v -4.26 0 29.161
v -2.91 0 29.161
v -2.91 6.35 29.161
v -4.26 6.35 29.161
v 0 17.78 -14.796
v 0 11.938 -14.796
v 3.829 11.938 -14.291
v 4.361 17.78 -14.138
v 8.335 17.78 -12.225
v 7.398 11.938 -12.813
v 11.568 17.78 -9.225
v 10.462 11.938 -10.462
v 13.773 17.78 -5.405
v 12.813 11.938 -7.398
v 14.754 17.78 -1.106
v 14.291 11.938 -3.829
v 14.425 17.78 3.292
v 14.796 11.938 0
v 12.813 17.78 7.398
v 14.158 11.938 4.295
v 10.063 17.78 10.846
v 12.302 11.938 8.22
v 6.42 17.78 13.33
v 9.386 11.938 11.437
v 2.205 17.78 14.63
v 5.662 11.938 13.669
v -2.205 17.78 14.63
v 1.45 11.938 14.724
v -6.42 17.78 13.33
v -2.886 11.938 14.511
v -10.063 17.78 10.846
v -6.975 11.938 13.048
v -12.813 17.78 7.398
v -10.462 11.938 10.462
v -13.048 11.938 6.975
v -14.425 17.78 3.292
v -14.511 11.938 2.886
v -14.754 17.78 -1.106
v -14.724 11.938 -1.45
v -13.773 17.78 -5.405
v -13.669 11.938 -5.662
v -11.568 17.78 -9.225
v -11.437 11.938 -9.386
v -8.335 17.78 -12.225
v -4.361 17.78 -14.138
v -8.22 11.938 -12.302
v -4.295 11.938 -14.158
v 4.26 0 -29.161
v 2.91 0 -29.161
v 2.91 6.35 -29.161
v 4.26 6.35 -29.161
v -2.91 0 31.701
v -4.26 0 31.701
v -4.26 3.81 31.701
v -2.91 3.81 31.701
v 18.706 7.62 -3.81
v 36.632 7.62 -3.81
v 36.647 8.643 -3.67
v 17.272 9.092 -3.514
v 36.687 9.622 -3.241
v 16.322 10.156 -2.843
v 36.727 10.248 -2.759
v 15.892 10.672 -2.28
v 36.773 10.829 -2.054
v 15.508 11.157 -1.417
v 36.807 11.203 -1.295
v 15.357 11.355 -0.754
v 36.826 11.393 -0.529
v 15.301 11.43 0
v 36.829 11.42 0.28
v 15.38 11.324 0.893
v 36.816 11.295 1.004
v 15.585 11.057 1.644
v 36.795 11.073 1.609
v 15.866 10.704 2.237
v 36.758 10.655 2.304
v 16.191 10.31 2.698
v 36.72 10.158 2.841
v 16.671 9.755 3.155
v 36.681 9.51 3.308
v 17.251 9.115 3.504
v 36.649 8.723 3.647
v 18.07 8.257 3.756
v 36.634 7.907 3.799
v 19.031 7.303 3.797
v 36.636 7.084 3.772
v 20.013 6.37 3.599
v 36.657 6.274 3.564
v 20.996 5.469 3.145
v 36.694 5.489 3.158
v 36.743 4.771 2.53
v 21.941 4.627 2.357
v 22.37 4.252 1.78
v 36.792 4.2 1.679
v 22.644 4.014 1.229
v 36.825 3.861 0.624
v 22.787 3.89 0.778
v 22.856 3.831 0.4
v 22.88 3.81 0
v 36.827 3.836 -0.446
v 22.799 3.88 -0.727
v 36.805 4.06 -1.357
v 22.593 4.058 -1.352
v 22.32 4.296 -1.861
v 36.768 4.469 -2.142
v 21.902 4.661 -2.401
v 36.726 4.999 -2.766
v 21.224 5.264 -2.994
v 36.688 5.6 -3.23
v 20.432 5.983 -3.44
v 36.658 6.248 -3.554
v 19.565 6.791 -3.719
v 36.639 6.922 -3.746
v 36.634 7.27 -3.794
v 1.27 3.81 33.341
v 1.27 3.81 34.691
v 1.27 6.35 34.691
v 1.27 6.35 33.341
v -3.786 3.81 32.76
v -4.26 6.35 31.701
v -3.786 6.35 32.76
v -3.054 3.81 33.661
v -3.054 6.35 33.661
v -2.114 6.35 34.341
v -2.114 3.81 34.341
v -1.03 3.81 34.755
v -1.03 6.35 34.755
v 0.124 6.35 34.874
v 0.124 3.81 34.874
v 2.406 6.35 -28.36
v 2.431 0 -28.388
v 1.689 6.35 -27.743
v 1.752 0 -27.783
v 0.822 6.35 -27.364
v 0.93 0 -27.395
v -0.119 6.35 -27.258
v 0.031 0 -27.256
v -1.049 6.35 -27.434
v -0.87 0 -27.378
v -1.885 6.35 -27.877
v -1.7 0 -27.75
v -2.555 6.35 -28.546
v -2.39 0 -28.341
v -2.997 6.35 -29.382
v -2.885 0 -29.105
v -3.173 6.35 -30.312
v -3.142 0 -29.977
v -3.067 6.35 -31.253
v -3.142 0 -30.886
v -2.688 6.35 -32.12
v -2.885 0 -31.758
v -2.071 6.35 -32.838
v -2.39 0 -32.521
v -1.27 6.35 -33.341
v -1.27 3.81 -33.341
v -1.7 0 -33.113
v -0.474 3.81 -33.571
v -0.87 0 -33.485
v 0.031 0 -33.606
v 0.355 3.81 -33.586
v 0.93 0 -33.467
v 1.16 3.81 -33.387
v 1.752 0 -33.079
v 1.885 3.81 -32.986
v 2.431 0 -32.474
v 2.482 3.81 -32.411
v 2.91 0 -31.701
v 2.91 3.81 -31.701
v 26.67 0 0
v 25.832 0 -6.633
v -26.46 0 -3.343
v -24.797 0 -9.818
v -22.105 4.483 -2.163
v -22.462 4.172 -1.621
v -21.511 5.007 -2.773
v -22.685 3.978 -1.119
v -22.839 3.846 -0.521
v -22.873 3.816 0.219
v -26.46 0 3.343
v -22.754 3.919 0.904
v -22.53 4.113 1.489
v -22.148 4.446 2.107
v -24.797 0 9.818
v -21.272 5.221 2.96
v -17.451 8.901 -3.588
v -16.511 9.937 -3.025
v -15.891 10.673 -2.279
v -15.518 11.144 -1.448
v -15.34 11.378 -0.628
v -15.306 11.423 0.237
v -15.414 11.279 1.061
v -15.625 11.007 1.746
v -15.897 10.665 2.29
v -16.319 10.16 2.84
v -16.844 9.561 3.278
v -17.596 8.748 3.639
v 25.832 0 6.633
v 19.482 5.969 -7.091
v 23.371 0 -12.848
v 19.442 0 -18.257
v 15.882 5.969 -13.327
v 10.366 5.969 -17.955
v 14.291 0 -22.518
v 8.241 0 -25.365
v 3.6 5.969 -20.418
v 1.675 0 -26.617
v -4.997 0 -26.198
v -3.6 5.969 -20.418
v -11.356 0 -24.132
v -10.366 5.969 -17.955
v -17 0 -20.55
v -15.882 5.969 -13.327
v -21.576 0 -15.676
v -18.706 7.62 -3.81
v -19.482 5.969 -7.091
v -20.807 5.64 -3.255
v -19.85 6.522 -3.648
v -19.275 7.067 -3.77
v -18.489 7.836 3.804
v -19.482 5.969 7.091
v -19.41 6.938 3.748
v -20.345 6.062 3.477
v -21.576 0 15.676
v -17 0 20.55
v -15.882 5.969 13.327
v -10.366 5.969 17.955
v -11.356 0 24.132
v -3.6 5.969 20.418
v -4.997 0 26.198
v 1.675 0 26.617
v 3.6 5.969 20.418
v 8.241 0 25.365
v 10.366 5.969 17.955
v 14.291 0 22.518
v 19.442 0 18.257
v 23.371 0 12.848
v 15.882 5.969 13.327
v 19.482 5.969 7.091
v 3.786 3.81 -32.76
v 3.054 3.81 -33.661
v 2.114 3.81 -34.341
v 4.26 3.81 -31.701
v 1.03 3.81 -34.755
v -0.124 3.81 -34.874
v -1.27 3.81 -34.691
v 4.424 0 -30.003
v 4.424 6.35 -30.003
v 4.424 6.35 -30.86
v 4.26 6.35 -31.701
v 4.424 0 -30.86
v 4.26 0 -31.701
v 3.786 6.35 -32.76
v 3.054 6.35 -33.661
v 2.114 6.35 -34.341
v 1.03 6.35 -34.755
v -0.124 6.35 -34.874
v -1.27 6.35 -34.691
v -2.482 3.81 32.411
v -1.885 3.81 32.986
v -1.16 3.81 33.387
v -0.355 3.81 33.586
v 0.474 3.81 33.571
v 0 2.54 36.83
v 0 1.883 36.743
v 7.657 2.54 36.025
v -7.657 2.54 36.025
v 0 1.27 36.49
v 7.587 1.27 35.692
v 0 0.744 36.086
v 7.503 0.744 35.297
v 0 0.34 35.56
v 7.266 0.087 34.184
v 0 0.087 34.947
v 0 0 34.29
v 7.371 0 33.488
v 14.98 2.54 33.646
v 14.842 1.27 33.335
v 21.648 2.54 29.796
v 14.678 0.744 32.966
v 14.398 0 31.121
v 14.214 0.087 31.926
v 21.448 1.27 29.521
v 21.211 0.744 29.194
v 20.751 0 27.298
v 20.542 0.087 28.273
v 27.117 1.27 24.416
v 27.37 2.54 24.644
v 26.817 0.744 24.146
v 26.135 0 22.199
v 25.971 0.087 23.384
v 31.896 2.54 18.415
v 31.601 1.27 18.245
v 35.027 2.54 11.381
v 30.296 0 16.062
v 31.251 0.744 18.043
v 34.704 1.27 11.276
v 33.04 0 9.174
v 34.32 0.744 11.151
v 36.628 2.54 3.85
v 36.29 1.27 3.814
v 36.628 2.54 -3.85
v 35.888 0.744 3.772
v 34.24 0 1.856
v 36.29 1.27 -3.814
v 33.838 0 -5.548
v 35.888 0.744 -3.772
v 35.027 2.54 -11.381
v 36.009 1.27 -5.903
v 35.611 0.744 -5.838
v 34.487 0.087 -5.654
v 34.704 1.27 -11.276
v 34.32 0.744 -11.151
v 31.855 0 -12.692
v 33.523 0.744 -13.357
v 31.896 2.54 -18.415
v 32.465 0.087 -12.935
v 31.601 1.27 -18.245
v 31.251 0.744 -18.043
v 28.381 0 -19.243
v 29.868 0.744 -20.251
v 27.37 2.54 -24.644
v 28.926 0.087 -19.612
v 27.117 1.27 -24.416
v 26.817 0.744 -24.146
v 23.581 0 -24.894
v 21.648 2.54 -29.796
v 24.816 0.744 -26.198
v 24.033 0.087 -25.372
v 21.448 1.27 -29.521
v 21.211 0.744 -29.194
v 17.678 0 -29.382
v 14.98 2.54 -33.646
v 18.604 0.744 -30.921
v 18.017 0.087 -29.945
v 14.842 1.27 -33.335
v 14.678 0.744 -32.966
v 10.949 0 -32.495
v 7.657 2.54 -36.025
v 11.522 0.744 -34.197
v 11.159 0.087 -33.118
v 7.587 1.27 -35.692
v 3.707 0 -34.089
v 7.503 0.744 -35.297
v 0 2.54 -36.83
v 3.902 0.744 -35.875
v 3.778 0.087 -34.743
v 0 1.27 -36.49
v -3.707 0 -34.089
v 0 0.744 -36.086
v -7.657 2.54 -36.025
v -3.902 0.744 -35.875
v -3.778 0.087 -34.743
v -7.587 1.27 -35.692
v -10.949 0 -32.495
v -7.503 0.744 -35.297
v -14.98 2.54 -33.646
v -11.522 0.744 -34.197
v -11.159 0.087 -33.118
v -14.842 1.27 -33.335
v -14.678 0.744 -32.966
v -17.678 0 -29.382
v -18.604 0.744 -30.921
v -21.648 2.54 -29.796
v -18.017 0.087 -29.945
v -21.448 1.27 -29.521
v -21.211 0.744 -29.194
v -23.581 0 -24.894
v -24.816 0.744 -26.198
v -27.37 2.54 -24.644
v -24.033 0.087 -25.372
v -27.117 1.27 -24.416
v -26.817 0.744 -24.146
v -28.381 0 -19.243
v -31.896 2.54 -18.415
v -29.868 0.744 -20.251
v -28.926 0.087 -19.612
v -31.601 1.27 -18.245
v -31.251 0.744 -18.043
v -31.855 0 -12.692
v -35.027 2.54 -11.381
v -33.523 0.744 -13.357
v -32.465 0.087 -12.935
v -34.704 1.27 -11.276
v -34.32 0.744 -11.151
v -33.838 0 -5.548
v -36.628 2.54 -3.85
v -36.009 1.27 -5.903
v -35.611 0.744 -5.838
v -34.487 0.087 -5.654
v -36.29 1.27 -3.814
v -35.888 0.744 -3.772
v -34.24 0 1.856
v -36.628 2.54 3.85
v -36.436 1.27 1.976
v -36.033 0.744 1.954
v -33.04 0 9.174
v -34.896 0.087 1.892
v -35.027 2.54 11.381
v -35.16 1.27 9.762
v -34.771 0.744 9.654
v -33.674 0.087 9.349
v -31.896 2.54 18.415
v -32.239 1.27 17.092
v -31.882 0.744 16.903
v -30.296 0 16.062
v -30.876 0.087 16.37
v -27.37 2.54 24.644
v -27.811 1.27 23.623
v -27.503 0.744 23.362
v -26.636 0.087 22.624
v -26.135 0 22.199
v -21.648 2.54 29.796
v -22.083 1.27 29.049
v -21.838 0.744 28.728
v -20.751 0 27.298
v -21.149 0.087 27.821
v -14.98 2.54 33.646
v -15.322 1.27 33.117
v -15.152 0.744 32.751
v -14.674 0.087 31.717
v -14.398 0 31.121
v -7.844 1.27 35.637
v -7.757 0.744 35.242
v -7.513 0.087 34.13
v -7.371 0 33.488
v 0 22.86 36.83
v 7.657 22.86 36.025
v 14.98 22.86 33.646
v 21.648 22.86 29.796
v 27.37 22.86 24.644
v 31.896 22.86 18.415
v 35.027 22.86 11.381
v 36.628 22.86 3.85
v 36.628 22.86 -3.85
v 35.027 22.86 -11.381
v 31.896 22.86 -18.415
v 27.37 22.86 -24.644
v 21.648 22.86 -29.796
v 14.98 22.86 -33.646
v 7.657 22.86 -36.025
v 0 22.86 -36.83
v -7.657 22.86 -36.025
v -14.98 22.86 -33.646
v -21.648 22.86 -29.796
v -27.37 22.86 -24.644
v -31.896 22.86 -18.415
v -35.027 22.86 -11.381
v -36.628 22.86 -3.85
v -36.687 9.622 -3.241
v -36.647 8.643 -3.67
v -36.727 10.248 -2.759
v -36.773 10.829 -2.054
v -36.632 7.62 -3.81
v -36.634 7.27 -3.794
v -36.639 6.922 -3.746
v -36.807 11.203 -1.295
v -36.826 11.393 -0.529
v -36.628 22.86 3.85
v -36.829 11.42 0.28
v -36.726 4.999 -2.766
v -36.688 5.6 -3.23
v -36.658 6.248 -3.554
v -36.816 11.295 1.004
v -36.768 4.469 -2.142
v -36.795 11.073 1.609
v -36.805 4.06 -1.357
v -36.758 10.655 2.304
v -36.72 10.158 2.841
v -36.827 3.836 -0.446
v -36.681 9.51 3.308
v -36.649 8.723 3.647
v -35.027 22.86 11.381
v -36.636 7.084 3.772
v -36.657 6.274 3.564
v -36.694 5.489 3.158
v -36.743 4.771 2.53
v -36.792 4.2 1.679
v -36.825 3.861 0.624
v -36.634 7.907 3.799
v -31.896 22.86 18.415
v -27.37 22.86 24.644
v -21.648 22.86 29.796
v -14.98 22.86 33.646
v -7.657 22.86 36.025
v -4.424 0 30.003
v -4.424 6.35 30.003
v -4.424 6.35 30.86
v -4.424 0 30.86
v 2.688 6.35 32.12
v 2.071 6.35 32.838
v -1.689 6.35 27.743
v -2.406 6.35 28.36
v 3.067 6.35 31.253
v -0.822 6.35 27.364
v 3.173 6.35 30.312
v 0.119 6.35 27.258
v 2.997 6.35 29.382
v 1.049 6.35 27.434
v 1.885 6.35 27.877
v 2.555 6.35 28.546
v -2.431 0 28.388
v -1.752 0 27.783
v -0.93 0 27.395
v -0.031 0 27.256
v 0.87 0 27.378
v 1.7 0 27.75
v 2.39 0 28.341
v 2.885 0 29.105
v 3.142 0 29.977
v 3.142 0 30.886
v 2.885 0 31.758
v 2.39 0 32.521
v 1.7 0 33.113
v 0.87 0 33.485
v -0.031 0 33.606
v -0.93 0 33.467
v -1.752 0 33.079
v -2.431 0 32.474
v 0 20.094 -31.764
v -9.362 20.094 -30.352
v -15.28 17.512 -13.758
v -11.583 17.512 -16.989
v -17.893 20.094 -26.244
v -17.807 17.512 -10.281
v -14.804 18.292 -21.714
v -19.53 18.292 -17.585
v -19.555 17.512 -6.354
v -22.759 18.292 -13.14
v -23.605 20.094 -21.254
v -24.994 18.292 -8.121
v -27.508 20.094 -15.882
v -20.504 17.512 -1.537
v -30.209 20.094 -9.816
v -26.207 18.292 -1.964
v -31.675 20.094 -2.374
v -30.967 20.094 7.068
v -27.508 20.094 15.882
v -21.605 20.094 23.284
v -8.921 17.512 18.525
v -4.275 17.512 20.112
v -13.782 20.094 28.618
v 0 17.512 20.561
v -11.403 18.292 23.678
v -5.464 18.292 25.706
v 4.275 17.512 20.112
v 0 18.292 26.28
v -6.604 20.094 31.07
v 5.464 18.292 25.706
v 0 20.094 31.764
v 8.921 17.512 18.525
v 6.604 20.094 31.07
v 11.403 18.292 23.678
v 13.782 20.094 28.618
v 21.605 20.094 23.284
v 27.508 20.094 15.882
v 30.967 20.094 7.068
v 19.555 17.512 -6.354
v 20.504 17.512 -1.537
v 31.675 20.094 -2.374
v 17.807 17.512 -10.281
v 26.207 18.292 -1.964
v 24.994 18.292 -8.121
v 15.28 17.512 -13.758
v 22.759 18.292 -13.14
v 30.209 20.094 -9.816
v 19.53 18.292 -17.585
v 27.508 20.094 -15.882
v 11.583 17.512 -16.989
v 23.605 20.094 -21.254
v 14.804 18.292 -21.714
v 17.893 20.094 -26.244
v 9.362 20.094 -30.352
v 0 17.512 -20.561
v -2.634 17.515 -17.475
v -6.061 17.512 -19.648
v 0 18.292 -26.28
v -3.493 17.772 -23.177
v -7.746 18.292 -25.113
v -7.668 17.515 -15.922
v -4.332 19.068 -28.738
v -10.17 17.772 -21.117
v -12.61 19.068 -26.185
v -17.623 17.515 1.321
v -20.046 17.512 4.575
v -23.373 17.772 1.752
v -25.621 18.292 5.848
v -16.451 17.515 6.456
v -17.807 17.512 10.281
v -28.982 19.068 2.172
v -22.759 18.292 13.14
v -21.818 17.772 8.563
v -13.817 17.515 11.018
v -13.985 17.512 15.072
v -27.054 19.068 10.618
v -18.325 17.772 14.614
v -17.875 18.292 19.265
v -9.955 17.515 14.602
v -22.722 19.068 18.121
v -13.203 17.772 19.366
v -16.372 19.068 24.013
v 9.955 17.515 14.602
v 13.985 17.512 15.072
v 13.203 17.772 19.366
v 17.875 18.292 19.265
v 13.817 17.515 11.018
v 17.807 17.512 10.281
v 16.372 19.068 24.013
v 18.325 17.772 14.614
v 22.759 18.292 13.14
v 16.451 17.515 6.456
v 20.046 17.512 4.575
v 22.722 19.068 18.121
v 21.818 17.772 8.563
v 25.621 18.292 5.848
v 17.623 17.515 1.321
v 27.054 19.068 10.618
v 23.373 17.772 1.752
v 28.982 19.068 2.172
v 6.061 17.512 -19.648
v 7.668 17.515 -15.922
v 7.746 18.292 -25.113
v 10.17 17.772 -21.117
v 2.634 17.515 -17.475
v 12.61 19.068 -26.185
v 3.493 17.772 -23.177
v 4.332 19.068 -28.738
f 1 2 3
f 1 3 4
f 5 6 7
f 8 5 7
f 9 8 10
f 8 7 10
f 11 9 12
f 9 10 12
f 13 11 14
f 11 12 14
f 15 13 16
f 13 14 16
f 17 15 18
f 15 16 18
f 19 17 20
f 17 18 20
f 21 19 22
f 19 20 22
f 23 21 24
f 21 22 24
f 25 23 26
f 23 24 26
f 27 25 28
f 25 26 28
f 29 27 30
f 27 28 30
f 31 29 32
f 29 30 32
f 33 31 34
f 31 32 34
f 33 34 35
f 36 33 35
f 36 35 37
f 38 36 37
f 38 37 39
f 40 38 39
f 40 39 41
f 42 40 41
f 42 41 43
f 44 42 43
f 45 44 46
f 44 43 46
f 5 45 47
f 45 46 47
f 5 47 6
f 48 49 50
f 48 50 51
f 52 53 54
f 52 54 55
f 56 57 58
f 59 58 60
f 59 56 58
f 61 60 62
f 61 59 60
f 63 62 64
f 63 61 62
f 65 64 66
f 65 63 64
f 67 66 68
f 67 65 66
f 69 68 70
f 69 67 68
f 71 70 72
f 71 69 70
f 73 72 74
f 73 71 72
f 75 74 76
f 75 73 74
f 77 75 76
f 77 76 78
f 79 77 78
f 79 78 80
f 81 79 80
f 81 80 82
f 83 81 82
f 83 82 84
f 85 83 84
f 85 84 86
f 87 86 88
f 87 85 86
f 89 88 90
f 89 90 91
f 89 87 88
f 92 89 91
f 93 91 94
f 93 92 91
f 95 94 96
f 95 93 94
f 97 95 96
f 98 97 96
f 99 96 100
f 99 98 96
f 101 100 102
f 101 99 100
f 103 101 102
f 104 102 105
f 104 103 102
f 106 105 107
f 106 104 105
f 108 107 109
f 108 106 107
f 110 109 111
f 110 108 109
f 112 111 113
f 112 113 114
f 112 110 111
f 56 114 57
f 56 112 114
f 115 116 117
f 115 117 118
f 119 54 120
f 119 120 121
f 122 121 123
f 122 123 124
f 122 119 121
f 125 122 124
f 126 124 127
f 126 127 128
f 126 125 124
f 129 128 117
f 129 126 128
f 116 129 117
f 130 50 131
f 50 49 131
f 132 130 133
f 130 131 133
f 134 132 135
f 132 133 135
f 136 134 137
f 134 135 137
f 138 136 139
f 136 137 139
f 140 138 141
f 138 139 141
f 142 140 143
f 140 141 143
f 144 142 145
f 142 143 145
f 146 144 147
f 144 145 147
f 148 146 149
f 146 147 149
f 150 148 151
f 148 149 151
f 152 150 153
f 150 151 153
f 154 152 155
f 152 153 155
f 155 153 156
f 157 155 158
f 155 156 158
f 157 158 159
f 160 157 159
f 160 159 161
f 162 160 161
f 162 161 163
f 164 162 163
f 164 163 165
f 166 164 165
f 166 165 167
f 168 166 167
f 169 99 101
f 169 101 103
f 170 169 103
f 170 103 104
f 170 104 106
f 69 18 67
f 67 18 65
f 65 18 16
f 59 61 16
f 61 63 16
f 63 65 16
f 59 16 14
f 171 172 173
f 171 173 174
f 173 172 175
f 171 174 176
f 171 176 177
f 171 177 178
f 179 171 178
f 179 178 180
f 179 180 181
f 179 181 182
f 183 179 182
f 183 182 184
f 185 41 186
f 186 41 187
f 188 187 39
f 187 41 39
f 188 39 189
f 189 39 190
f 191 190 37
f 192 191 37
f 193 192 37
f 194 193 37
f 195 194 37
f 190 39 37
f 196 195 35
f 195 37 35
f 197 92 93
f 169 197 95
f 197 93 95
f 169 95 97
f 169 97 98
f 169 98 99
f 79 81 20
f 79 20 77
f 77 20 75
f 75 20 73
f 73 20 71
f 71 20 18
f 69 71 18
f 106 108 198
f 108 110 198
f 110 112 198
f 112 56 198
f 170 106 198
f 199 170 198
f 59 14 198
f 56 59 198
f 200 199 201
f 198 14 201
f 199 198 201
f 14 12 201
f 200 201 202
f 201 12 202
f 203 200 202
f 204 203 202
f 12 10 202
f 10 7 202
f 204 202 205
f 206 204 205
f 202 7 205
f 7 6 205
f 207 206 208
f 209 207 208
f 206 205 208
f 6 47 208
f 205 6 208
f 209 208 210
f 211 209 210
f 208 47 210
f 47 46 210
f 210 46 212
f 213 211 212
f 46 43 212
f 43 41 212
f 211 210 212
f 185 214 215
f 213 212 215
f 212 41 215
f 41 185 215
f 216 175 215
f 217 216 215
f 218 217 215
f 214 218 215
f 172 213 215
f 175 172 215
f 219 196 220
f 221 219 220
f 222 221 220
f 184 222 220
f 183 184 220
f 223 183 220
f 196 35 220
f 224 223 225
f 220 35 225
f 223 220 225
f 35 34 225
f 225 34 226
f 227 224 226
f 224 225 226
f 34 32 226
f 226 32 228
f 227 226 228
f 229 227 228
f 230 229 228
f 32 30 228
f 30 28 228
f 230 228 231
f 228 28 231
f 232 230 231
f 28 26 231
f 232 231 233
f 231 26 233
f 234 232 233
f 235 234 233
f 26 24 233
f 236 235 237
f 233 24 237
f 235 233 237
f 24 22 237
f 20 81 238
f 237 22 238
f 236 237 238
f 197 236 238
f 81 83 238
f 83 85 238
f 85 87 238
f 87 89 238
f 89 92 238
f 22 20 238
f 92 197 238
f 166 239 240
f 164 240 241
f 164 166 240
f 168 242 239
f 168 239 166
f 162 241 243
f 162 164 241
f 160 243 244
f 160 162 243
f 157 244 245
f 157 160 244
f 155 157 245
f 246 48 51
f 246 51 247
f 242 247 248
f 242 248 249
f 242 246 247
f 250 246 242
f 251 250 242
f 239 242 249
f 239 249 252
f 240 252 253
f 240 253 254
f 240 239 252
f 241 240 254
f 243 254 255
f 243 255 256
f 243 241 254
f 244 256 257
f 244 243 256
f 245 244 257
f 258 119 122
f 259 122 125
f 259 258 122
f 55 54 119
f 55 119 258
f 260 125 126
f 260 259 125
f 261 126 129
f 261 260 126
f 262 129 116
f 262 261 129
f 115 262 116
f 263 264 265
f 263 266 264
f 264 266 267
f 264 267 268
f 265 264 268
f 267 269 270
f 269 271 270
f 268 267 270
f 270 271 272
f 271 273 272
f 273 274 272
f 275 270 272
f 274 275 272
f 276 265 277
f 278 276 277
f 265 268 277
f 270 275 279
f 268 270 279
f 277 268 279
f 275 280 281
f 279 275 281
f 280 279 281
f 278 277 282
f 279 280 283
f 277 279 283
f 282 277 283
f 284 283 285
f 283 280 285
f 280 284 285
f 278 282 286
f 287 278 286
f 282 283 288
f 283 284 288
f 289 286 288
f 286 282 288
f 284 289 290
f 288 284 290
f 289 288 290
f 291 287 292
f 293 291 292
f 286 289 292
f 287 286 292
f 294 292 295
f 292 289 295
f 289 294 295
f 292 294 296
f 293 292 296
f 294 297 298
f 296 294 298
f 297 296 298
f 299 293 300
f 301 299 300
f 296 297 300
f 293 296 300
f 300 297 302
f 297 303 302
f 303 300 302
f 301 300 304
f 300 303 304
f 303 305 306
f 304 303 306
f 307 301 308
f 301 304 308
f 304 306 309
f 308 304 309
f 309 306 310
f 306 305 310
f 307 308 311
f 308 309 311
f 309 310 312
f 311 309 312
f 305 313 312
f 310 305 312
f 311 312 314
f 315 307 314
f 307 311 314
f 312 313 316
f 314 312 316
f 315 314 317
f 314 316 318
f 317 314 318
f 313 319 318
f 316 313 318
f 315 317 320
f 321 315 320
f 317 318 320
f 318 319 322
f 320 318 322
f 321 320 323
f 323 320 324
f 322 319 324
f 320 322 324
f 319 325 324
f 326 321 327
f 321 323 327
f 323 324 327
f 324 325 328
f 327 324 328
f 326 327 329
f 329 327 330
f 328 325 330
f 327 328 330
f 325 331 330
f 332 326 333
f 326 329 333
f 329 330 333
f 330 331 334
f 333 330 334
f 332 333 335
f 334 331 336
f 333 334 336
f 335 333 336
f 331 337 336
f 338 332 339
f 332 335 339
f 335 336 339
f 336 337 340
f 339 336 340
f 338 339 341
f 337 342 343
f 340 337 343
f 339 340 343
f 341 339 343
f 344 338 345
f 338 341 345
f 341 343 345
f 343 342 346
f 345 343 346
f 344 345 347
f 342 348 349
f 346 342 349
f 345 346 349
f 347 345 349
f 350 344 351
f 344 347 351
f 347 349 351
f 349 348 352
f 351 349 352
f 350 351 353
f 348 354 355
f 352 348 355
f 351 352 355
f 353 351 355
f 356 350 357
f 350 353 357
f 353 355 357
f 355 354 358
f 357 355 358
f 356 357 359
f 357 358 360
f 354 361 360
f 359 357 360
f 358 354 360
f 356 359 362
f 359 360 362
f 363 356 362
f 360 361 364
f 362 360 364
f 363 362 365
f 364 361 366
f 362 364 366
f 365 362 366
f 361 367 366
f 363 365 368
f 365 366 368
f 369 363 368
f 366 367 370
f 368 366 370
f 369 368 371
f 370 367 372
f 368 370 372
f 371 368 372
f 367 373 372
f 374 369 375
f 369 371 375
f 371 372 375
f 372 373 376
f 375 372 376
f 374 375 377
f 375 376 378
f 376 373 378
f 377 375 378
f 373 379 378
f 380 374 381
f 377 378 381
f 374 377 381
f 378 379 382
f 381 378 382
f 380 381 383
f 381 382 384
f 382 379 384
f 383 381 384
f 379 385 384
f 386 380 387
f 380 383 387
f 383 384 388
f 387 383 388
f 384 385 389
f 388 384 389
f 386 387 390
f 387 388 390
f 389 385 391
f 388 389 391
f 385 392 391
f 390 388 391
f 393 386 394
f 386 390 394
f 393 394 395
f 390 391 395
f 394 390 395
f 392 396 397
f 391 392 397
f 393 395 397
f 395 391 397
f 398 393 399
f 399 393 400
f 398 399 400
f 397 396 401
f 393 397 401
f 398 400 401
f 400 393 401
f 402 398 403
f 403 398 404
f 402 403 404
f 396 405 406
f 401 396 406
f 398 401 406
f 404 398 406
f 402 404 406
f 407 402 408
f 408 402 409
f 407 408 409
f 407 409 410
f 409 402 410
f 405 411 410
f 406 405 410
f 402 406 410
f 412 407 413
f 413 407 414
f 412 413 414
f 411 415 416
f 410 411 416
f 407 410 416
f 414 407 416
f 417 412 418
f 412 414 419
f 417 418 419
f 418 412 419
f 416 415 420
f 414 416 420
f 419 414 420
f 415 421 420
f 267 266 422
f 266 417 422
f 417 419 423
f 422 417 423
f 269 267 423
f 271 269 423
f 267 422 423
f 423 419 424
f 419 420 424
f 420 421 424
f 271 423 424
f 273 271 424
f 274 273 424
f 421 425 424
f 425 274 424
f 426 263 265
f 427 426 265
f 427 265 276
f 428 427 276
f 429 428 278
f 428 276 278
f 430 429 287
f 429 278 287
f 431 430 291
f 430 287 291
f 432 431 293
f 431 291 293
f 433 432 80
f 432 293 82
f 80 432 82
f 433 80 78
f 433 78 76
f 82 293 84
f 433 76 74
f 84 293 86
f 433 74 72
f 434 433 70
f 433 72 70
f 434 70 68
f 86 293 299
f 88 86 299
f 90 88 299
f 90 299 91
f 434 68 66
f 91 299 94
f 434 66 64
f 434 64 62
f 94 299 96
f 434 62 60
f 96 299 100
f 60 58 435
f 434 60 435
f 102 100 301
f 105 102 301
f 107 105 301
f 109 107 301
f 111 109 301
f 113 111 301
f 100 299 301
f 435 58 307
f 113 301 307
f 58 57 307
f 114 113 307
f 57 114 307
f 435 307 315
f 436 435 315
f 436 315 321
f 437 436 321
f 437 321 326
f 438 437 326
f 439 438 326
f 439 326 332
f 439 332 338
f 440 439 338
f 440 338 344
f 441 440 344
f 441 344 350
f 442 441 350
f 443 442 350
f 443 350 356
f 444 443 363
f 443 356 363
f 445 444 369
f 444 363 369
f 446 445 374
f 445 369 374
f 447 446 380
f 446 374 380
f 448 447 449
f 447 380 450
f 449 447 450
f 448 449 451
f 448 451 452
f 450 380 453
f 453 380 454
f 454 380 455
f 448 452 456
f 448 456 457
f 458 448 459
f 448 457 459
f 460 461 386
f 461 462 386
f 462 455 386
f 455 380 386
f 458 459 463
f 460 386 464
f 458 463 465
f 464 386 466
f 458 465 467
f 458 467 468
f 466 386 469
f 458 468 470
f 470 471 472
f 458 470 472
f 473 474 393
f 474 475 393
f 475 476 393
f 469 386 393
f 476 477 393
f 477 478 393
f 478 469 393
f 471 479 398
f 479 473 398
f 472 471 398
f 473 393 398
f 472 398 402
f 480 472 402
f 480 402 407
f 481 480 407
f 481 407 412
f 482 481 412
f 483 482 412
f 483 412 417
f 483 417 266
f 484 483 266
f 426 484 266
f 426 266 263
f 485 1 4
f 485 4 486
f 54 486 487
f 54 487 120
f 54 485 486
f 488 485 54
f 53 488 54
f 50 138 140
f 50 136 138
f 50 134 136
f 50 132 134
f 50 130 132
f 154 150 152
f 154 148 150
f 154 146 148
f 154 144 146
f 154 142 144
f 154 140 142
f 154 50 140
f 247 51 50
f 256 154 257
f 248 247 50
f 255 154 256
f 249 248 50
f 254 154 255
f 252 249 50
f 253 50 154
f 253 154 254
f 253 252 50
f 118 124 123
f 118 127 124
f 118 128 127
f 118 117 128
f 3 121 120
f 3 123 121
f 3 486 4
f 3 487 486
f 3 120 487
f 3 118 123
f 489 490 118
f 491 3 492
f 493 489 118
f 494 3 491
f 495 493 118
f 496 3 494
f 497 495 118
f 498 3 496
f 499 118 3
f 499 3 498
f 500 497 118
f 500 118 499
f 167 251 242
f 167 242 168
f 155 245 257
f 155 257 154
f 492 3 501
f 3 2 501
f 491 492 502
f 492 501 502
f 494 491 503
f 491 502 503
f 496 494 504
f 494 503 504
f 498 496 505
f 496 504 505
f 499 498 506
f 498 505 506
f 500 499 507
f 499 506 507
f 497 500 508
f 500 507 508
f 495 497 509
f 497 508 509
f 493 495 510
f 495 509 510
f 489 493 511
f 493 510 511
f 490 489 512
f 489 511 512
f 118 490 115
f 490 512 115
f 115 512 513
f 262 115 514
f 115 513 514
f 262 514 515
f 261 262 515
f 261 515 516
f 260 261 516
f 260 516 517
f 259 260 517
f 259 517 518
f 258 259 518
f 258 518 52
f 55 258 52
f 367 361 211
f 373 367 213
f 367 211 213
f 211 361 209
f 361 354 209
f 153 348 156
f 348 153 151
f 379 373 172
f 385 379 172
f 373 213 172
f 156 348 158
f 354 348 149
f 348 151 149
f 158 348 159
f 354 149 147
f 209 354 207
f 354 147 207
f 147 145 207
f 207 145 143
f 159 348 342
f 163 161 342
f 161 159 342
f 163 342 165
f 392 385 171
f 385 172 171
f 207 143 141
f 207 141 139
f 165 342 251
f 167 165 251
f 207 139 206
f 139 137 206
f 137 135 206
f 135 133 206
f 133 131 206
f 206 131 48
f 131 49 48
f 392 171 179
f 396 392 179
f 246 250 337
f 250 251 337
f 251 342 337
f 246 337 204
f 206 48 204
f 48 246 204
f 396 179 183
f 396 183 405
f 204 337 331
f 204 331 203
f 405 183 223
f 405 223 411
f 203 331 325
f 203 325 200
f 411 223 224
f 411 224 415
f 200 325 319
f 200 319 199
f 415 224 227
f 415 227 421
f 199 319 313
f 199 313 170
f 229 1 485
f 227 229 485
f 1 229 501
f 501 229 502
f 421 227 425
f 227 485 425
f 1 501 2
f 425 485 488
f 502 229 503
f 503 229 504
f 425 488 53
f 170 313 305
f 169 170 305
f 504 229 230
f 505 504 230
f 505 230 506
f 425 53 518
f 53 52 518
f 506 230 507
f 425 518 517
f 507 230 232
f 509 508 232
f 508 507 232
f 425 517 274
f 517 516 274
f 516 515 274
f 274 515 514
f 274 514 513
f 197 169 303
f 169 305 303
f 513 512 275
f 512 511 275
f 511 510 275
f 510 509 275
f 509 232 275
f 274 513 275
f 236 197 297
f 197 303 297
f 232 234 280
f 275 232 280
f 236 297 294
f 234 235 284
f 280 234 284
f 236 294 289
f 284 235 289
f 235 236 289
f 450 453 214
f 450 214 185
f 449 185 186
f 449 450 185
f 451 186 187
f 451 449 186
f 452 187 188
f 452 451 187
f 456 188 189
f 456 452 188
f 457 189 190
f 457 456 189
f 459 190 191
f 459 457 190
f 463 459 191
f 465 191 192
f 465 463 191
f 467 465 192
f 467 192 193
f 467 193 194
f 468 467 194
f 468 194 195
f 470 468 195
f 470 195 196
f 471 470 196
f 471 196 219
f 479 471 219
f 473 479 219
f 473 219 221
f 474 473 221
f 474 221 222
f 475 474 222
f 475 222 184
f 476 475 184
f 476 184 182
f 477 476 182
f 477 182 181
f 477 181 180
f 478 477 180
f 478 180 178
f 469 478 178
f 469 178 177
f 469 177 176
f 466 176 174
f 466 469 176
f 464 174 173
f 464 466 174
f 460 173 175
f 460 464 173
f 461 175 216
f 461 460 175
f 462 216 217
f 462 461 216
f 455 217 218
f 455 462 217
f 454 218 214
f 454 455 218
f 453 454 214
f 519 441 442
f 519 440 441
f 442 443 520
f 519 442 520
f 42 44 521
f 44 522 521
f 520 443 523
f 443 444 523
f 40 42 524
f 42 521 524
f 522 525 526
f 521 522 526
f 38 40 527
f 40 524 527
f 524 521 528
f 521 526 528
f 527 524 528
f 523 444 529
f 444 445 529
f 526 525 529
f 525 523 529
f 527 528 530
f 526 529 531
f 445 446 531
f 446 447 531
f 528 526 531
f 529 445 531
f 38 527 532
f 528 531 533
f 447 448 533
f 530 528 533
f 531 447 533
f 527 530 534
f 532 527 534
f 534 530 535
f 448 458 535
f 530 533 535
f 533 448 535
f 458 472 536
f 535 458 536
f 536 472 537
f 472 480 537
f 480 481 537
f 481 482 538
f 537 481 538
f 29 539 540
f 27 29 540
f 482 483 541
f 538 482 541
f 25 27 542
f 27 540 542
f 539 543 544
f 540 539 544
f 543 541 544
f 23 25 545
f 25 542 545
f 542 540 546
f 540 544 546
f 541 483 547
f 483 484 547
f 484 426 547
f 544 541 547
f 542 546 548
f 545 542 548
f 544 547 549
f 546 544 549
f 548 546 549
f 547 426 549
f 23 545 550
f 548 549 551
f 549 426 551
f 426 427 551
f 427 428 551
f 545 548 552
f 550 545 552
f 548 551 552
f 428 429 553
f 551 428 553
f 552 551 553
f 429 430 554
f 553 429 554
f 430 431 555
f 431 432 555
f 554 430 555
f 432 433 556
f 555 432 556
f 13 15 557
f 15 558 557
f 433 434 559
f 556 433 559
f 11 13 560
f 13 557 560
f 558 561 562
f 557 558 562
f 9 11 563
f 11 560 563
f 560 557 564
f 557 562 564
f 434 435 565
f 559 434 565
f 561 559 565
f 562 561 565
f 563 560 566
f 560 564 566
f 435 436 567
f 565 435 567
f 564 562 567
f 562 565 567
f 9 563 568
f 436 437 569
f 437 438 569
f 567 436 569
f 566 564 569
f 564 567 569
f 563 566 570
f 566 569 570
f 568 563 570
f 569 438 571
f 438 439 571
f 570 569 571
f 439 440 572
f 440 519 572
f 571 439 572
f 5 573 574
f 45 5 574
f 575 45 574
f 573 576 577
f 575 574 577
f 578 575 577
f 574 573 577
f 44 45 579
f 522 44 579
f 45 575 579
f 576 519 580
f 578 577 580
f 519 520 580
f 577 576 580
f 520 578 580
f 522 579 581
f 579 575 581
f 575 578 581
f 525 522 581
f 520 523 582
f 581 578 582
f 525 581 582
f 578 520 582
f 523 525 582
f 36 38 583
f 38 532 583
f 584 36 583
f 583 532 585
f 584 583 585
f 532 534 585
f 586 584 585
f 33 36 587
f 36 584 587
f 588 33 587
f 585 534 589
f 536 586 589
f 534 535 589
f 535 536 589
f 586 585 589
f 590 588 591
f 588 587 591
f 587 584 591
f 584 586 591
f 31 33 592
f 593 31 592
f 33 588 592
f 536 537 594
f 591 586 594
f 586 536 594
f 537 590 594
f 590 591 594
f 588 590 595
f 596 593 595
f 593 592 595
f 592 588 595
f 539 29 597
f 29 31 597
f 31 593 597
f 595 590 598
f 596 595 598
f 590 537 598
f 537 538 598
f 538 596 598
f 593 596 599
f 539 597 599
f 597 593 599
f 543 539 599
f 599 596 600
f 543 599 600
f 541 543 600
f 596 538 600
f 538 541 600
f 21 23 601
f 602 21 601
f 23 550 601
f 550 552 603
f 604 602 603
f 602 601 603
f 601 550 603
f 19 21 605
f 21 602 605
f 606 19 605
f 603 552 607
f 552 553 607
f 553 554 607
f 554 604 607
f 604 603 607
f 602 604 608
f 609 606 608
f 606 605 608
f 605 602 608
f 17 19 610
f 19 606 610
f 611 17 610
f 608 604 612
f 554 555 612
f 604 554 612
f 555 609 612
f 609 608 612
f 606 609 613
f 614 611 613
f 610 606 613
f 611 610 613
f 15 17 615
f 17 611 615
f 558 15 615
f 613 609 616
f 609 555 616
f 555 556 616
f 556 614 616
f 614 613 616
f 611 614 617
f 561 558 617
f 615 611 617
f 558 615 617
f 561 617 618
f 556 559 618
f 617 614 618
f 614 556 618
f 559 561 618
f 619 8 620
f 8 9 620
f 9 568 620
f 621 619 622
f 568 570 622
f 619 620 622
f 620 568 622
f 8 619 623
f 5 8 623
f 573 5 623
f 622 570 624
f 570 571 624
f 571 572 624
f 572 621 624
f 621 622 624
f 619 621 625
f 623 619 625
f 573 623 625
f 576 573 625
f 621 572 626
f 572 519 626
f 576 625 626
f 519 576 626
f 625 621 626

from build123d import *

# Parameters (mm, degrees)
SKETCH1_R               = 36.83
BOSS_EXTRUDE1_DEPTH     = 22.86
FILLET1_R               = 2.54
SKETCH2_R               = 26.67
SKETCH3_R               = 14.7955
SKETCH4_R               = 14.7955
CUT_EXTRUDE1_DEPTH      = 76.2
SKETCH18_R              = 3.175
CUT_EXTRUDE2_DEPTH      = 6.35
CUT_EXTRUDE3_DEPTH      = 6.35
CUT_EXTRUDE4_START      = 2.54
CUT_EXTRUDE4_DEPTH      = 2.54
CIRPATTERN1_COUNT       = 2
CUT_EXTRUDE5_DEPTH      = 57.881257188
CUT_EXTRUDE5_DEPTH_BACK = 57.881257188
SKETCH22_R              = 3.81


with BuildPart() as part:
    # Sketch1 → Boss-Extrude1 (new body)
    with BuildSketch(Plane(origin=(0, 0, 0), x_dir=(1, 0, 0), z_dir=(0, 1, 0))):
        with Locations(Location((0, 0, 0), (0, 0, 270))):
            Circle(SKETCH1_R)
    extrude(amount=BOSS_EXTRUDE1_DEPTH)

    # Fillet1
    fillet1_edges = [part.edges().sort_by_distance(p)[0] for p in [
        (0, 0, -36.83),
    ]]
    fillet(fillet1_edges, radius=FILLET1_R)

    # Sketch2 → Cut-Loft1 section 0
    with BuildSketch(Plane(origin=(0, 0, 0), x_dir=(1, 0, 0), z_dir=(0, 1, 0))):
        Circle(SKETCH2_R)
    # Sketch3 → Cut-Loft1 section 1
    with BuildSketch(Plane(origin=(0, 11.938, 0), x_dir=(1, 0, 0), z_dir=(0, 1, 0))):
        Circle(SKETCH3_R)
    loft(mode=Mode.SUBTRACT)

    # Sketch4 → Cut-Extrude1 (cut)
    with BuildSketch(Plane.XZ.offset(-11.938)):
        with Locations(Location((0, 0, 0), (0, 0, 270))):
            Circle(SKETCH4_R)
    extrude(amount=-CUT_EXTRUDE1_DEPTH, mode=Mode.SUBTRACT)

    # Sketch17 → Cut-Revolve1 (revolve, cut)
    with BuildSketch(Plane(origin=(0, 0, 0), x_dir=(0, 0, -1), z_dir=(1, 0, 0))):
        with BuildLine():
            Line((36.83, 22.86), (14.7955, 22.86))
            Line((14.7955, 22.86), (14.7955, 17.78))
            ThreePointArc((14.7955, 17.78), (26.280325712, 18.29189035), (36.83, 22.86))
        make_face()
    revolve(axis=Axis((0, 0, 0), (0, 1, 0)), mode=Mode.SUBTRACT)

    # Sketch18 → Cut-Extrude2 (cut)
    with BuildSketch(Plane.XZ):
        with Locations(Location((0, 30.431156816, 0), (0, 0, 270))):
            Circle(SKETCH18_R)
        with Locations(Location((0, -30.431156816, 0), (0, 0, 270))):
            Circle(SKETCH18_R)
    extrude(amount=-CUT_EXTRUDE2_DEPTH, mode=Mode.SUBTRACT)

    # Sketch19 → Cut-Extrude3 (cut)
    with BuildSketch(Plane.XZ):
        with BuildLine():
            Line((4.259709497, -31.701156816), (2.909935566, -31.701156816))
            ThreePointArc((2.909935566, -31.701156816), (3.175, -30.431156816), (2.909935566, -29.161156816))
            Line((2.909935566, -29.161156816), (4.259709497, -29.161156816))
            ThreePointArc((4.259709497, -29.161156816), (4.445, -30.431156816), (4.259709497, -31.701156816))
        make_face()
    cut_extrude3 = extrude(amount=-CUT_EXTRUDE3_DEPTH, mode=Mode.SUBTRACT)

    # Sketch20 → Cut-Extrude4 (cut)
    with BuildSketch(Plane.XZ.offset(-6.35).offset(CUT_EXTRUDE4_START)):
        with BuildLine():
            Line((-1.27, -34.690866313), (-1.27, -33.341092382))
            ThreePointArc((-1.27, -33.341092382), (1.15960956, -33.3868176), (2.909935566, -31.701156816))
            Line((2.909935566, -31.701156816), (4.259709497, -31.701156816))
            ThreePointArc((4.259709497, -31.701156816), (2.114043859, -34.341251899), (-1.27, -34.690866313))
        make_face()
    cut_extrude4 = extrude(amount=-CUT_EXTRUDE4_DEPTH, mode=Mode.SUBTRACT)

    # CirPattern1: Cut-Extrude3, Cut-Extrude4 ×2 about axis
    cirpattern1_axis = Axis((0, 0, 0), (0, 1, 0))
    add([cut_extrude3.rotate(cirpattern1_axis, i * 360 / CIRPATTERN1_COUNT) for i in range(1, CIRPATTERN1_COUNT)], mode=Mode.SUBTRACT)
    add([cut_extrude4.rotate(cirpattern1_axis, i * 360 / CIRPATTERN1_COUNT) for i in range(1, CIRPATTERN1_COUNT)], mode=Mode.SUBTRACT)

    # Sketch22 → Cut-Extrude5 (cut, two sides: drawn at the far end of the back side and taken through both)
    with BuildSketch(Plane(origin=(0, 0, 0), x_dir=(0, 0, -1), z_dir=(1, 0, 0)).offset(-CUT_EXTRUDE5_DEPTH_BACK)):
        with Locations((0, 7.62)):
            Circle(SKETCH22_R)
    extrude(amount=CUT_EXTRUDE5_DEPTH + CUT_EXTRUDE5_DEPTH_BACK, mode=Mode.SUBTRACT)


solid = part.part
